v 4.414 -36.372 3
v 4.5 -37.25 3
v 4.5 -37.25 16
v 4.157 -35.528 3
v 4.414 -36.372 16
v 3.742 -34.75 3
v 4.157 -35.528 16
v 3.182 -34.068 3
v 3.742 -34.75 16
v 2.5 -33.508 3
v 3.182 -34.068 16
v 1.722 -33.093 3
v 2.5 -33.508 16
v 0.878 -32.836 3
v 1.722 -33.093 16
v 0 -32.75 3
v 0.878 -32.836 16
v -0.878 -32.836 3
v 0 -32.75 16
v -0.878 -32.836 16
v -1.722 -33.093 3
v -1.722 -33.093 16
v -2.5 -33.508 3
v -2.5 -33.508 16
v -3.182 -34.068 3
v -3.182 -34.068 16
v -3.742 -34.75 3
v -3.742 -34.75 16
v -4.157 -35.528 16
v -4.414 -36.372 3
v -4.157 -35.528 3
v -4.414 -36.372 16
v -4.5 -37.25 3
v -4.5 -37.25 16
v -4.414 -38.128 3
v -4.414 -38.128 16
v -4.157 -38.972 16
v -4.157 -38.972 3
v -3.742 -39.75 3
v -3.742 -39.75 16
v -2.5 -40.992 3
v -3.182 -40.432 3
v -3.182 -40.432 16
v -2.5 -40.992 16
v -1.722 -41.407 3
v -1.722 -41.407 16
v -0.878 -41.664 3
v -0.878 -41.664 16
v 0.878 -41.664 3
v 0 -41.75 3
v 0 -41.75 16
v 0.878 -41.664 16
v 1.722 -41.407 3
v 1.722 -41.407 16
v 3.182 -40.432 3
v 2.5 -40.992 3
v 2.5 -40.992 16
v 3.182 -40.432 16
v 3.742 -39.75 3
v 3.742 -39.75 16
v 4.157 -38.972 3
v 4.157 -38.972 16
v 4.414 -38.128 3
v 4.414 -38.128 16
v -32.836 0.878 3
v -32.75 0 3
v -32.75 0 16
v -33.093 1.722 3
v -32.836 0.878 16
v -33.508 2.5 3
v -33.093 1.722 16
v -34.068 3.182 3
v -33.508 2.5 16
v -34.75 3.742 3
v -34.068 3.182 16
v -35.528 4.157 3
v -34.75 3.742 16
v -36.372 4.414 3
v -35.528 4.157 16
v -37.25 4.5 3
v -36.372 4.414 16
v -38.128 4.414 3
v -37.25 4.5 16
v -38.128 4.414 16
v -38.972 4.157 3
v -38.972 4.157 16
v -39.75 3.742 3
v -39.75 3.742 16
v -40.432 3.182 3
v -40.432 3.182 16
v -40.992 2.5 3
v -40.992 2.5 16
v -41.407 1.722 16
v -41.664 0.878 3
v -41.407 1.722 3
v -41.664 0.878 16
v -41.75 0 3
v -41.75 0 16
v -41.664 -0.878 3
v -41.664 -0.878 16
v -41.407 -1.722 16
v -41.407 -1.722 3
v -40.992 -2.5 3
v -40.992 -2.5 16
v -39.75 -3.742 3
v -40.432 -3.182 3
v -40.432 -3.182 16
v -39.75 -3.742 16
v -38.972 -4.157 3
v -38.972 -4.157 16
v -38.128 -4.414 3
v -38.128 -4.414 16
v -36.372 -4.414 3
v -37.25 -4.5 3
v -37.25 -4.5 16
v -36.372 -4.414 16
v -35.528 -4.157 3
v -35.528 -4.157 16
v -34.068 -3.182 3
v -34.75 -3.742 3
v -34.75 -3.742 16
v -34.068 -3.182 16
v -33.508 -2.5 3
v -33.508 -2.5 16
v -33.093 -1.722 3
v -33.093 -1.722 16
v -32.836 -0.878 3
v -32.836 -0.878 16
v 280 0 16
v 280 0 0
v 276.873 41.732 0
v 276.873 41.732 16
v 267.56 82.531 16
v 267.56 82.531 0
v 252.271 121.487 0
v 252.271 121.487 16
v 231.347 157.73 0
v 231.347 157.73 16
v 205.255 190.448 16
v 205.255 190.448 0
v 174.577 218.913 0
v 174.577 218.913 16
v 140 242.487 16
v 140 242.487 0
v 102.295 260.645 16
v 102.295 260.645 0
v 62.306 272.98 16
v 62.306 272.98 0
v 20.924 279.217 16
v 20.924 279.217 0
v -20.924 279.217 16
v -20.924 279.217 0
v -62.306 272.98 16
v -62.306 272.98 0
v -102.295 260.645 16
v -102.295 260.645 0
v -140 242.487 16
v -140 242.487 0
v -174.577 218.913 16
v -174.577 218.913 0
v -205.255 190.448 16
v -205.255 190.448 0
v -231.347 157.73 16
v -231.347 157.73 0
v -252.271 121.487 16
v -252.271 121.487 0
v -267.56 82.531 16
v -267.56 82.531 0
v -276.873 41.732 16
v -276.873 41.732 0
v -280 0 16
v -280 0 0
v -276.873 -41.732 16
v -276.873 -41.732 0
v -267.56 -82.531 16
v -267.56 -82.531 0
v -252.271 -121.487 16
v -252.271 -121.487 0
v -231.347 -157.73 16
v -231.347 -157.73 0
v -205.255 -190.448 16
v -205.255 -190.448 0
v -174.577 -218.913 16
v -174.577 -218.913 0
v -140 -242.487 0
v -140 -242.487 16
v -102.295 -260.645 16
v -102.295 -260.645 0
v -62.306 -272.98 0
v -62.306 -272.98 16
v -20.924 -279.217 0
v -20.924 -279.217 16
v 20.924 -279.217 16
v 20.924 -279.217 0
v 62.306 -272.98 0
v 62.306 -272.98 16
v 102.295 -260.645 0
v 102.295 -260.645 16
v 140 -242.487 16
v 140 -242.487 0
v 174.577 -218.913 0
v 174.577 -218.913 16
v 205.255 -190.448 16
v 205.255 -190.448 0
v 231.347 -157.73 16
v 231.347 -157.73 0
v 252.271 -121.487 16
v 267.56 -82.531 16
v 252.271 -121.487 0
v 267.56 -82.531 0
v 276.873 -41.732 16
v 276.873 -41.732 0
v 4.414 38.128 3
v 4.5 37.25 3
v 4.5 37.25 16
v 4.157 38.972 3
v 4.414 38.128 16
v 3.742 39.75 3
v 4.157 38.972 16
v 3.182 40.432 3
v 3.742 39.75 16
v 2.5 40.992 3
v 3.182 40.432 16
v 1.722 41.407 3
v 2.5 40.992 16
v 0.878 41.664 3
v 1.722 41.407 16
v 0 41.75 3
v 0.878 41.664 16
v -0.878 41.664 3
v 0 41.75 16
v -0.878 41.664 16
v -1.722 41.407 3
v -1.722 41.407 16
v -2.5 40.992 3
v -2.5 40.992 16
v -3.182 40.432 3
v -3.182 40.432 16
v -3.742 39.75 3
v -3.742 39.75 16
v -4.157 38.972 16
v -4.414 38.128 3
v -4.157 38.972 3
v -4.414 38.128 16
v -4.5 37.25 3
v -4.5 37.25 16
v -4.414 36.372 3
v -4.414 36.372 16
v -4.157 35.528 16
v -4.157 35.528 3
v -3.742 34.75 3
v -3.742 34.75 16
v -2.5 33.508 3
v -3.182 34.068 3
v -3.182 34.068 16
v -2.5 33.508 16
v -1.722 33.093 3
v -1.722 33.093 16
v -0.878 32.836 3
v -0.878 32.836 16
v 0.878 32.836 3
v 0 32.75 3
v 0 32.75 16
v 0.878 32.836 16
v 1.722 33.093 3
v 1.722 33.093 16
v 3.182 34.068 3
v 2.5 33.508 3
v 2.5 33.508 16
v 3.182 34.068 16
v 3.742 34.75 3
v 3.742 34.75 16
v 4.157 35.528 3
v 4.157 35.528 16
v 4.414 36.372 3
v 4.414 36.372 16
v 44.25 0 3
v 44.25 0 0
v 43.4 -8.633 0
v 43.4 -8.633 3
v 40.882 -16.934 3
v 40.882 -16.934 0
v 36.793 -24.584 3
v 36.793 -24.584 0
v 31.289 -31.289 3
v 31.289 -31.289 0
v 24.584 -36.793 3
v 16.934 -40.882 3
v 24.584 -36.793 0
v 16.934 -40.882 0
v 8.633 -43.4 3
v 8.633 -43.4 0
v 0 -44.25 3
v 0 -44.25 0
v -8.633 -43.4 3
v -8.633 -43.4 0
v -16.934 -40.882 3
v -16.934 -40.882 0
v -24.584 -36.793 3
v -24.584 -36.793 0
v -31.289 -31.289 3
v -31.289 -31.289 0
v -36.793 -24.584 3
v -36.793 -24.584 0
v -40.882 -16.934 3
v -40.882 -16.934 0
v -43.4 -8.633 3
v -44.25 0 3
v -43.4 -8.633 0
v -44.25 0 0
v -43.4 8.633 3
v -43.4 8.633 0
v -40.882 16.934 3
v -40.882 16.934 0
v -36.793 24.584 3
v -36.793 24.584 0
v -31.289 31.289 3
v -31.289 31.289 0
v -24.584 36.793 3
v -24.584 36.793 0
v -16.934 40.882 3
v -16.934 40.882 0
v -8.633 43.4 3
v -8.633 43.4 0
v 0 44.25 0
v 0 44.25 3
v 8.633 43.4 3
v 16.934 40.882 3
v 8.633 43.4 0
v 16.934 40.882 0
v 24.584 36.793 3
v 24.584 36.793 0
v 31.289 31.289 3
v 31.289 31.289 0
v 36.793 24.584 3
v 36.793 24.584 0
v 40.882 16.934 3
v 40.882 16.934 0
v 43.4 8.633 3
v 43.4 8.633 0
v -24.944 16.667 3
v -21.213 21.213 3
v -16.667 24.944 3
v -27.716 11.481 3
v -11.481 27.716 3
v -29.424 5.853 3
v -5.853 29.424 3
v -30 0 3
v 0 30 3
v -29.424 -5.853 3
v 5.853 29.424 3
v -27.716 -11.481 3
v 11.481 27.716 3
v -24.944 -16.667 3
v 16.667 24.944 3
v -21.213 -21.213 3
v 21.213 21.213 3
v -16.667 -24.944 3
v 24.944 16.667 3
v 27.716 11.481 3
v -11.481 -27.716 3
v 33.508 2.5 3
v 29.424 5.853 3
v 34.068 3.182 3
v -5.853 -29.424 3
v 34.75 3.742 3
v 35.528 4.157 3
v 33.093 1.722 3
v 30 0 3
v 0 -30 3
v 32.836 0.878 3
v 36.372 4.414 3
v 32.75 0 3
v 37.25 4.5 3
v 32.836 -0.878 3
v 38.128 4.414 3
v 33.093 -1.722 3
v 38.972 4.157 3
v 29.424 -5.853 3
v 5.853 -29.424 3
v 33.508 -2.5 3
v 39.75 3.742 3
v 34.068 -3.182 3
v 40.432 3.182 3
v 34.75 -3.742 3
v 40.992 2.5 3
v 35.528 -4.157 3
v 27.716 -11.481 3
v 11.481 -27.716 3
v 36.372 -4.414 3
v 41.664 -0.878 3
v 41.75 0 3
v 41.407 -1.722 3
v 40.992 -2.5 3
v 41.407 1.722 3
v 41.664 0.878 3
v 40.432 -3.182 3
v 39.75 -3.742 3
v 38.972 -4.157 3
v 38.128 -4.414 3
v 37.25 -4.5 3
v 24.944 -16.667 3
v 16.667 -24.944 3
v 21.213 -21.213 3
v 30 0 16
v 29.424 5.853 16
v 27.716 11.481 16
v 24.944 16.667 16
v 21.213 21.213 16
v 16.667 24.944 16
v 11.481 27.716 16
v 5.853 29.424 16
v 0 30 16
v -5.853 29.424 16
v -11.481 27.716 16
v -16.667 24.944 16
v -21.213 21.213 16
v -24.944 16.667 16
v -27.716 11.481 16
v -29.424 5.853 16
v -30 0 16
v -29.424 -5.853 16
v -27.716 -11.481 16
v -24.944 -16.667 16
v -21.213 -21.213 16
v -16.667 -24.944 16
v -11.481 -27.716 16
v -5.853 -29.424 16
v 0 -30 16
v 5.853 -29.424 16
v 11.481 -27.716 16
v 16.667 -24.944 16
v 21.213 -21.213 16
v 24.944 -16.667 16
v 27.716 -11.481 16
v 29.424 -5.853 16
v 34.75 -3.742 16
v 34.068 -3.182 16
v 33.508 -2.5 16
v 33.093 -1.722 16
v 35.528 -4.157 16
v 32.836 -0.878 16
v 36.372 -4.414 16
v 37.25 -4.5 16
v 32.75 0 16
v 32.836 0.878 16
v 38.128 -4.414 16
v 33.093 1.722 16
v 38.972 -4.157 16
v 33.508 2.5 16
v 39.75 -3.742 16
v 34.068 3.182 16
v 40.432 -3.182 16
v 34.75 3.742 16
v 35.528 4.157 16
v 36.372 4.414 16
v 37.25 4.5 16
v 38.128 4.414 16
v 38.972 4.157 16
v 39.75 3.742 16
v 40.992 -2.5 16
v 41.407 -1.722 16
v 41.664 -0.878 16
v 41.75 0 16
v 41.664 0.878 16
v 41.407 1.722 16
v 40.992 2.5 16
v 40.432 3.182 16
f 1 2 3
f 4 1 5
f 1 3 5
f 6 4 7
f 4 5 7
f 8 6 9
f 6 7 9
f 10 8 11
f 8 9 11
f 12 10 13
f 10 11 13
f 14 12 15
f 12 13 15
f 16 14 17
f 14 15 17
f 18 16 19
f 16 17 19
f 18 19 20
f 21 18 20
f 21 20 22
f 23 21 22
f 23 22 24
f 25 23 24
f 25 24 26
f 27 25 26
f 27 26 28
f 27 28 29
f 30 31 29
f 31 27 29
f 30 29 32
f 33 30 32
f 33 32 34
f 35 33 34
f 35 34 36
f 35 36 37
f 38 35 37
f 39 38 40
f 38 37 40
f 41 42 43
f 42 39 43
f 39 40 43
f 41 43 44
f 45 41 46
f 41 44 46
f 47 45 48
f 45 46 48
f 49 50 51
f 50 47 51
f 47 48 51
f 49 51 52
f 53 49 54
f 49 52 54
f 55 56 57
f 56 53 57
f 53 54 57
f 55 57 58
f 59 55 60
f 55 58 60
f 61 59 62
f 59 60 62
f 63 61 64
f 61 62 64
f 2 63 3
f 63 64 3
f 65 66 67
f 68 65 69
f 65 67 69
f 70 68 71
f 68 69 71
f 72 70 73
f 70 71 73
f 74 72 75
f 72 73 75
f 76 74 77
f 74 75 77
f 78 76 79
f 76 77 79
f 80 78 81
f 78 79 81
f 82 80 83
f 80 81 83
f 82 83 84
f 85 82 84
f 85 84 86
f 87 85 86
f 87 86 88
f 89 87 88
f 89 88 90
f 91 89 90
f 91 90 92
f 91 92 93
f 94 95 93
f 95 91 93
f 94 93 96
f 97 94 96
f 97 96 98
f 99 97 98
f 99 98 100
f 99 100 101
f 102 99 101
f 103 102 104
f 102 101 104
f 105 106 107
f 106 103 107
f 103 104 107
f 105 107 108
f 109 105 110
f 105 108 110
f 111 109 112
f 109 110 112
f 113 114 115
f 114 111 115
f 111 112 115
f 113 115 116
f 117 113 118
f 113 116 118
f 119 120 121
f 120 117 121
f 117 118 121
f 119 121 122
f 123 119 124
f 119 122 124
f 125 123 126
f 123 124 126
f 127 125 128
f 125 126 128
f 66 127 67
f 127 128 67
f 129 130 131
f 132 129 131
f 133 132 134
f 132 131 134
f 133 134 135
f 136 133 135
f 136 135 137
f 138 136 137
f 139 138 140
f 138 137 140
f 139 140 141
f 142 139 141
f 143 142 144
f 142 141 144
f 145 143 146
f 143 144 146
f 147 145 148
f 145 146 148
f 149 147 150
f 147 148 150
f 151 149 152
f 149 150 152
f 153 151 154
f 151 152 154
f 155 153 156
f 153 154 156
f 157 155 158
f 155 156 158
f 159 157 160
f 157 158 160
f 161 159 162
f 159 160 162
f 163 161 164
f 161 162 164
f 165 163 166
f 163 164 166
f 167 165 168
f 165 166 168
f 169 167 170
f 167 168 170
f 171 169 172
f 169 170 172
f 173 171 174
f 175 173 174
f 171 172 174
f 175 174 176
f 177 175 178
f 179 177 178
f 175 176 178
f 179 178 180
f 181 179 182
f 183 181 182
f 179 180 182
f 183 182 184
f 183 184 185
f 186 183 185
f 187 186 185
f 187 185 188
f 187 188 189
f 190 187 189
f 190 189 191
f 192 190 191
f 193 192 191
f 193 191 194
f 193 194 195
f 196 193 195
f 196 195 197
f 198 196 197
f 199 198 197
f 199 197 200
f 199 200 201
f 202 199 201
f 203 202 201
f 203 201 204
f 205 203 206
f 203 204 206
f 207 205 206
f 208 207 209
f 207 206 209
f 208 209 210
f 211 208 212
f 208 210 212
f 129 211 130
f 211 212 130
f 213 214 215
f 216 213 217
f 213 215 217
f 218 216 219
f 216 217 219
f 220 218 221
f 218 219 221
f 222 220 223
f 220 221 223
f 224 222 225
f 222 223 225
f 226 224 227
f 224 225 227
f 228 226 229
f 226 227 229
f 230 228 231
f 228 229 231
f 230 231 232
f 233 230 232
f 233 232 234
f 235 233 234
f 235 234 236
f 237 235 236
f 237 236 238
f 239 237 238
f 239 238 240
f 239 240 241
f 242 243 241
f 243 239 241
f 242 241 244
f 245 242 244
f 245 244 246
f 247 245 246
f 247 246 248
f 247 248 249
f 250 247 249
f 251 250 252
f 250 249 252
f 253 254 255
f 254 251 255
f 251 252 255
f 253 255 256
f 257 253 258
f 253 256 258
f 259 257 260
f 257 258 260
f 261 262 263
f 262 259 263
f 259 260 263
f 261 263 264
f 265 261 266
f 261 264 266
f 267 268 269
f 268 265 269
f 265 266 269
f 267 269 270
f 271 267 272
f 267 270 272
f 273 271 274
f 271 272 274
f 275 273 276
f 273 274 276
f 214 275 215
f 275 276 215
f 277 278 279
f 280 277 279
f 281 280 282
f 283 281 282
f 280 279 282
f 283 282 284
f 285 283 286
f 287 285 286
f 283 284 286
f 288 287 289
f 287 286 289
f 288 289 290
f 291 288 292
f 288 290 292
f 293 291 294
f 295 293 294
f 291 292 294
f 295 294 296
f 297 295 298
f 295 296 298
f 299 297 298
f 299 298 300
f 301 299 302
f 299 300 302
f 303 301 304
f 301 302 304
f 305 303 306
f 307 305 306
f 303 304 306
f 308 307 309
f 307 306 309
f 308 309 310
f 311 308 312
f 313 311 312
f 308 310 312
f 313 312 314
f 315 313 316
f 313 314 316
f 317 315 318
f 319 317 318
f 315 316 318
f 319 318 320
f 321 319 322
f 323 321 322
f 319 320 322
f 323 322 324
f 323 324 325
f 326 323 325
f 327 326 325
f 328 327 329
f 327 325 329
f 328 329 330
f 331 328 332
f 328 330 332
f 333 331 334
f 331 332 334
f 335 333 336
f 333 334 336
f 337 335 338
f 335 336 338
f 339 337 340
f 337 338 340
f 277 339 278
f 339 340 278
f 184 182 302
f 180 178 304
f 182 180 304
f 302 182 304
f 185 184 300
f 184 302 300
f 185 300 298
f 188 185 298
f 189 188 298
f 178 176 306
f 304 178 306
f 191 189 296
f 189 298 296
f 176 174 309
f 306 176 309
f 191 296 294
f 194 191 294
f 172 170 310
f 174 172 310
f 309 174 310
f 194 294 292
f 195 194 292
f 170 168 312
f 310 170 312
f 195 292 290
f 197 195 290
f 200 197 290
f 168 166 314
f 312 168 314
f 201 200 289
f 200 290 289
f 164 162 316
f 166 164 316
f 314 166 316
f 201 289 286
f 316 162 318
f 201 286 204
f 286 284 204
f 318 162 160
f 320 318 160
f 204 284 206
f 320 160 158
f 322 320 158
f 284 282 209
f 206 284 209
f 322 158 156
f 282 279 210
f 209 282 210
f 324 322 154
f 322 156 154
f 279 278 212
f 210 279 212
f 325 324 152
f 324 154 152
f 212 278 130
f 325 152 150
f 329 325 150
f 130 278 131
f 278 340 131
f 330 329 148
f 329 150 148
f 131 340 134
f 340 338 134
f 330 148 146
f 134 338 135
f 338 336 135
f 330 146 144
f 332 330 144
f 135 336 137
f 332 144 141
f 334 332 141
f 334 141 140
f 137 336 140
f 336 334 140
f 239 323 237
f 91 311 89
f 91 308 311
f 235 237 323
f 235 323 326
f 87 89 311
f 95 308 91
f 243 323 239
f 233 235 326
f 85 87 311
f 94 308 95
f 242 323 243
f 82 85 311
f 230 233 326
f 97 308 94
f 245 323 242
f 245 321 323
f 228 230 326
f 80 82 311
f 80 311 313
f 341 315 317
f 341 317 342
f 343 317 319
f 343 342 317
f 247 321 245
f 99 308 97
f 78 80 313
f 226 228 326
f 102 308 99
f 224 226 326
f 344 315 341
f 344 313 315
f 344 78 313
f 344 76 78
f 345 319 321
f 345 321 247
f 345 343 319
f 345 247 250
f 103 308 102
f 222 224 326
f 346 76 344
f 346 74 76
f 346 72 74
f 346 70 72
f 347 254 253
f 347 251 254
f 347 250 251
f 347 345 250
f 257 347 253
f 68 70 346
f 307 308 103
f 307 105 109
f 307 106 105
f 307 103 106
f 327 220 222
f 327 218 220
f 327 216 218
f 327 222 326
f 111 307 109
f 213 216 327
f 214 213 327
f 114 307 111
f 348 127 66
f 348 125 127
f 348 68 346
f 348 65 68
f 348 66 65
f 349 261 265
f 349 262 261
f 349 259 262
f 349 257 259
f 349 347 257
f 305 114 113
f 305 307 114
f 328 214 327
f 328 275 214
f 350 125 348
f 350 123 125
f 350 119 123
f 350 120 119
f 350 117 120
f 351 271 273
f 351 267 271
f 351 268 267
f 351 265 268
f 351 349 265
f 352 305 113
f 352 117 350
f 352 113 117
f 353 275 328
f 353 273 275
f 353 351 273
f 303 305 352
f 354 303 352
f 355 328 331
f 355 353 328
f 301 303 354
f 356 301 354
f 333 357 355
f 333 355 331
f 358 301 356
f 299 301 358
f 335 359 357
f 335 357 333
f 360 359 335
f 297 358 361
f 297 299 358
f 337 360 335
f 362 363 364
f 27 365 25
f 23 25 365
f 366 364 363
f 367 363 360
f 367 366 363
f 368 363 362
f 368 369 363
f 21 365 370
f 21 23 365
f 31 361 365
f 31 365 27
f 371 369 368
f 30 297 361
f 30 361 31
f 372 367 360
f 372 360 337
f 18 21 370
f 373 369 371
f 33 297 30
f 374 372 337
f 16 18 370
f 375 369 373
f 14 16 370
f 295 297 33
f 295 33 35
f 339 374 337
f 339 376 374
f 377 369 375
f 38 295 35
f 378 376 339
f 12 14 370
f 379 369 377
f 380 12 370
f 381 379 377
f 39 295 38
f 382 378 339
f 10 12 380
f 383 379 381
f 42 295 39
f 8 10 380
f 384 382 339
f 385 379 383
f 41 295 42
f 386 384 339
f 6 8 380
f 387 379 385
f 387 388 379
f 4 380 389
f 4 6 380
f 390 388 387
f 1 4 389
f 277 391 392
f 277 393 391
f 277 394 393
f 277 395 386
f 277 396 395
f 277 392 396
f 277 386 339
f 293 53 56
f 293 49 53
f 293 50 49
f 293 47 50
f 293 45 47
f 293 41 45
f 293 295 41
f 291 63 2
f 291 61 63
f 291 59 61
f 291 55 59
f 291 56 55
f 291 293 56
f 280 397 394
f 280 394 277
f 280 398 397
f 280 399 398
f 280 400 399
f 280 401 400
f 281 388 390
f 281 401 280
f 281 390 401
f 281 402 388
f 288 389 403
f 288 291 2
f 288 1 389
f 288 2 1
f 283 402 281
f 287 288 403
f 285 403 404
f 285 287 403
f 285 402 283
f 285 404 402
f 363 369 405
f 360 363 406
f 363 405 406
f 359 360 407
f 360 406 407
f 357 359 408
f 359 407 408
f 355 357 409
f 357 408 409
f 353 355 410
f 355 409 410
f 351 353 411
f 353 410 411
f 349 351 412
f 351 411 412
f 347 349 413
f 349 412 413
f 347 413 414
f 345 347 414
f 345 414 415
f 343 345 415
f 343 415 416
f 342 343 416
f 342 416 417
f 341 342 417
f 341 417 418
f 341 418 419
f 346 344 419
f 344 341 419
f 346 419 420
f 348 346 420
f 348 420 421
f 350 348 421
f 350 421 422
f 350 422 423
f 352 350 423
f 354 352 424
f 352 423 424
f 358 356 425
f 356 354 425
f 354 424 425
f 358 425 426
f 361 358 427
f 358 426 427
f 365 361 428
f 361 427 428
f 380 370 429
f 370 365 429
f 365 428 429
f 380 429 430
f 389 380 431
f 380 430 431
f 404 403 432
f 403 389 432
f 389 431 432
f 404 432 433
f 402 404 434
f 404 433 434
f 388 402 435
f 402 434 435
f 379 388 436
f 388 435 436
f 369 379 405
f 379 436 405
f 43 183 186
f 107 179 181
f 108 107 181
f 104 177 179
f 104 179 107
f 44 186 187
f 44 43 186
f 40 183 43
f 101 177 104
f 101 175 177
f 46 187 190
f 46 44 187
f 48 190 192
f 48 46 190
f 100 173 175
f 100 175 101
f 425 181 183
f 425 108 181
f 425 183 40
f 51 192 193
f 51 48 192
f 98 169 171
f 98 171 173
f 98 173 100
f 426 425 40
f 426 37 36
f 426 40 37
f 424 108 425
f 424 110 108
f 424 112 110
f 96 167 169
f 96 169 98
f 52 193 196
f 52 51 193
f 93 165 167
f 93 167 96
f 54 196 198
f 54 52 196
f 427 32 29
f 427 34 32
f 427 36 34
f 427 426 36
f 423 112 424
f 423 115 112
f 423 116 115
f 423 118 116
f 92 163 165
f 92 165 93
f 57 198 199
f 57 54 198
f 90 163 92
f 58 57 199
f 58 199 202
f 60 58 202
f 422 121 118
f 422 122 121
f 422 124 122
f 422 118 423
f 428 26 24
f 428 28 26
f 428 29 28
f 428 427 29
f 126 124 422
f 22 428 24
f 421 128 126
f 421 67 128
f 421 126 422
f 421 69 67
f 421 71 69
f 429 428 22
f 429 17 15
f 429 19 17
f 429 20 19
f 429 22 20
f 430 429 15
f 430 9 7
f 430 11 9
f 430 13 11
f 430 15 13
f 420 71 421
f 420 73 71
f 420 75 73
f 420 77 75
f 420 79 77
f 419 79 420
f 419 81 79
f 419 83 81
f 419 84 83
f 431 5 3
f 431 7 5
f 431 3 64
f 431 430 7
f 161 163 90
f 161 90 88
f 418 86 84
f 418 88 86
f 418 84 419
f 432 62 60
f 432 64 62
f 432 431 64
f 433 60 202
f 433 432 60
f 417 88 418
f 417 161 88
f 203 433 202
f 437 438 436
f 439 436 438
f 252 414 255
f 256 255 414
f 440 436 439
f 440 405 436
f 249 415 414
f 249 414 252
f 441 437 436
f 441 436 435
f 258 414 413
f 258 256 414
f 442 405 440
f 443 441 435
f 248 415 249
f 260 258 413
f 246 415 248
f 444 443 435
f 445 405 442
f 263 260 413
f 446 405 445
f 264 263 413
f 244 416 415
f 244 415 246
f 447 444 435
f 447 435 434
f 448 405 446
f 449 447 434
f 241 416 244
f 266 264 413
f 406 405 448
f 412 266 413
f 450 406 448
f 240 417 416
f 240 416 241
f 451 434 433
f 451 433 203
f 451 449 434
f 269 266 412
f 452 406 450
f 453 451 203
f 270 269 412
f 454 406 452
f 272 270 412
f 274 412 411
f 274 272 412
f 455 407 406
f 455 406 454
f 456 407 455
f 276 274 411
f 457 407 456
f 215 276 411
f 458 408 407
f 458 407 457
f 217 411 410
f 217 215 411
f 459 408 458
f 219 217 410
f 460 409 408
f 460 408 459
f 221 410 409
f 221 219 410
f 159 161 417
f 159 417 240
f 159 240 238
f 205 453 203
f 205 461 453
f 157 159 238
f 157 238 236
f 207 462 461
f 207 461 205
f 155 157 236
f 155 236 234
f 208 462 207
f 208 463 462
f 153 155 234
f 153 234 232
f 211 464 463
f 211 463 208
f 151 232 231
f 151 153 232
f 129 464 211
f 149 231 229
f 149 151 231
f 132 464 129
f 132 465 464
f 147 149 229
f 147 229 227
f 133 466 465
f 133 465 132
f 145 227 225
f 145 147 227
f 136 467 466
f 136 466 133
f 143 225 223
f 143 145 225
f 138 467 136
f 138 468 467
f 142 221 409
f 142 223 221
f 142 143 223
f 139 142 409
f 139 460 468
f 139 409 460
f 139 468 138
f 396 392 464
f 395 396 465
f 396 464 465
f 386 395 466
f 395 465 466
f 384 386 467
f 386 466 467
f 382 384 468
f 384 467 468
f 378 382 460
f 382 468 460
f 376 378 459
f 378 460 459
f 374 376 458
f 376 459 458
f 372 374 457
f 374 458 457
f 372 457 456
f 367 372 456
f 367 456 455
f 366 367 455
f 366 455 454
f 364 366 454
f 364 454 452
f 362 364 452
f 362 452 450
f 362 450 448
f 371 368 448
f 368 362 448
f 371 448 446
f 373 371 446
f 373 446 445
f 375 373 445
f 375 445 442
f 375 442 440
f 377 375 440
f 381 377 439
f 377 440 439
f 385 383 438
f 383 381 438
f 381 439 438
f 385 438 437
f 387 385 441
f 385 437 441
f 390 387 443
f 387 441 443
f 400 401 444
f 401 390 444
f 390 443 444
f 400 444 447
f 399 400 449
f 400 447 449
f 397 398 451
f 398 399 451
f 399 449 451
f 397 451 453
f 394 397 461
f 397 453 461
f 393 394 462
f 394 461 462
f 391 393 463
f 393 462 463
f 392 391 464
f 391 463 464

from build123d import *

# Parameters (mm, degrees)
F0_R     = 280
F1_DEPTH = 16
F2_R     = 30
F2_R_2   = 4.5
F3_DEPTH = 25
F4_R     = 44.25
F4_R_2   = 4.5
F4_R_3   = 30
F5_DEPTH = 3


# Not quite as in the source:
# - a feature names something its author has since deleted; it is built from what else it names


with BuildPart() as f1:
    # F0 (on Top) → F1 (new body)
    with BuildSketch(Plane.XY):
        Circle(F0_R)
    extrude(amount=F1_DEPTH)

    # F2 (on face) → F3 (cut)
    with BuildSketch(Plane.XY.offset(16)):
        Circle(F2_R)
        with Locations((-37.25, 0)):
            Circle(F2_R_2)
        with Locations((0, 37.25)):
            Circle(F2_R_2)
        with Locations((37.25, 0)):
            Circle(F2_R_2)
        with Locations((0, -37.25)):
            Circle(F2_R_2)
    extrude(amount=-F3_DEPTH, mode=Mode.SUBTRACT)

    # F4 (on face) → F5 (cut)
    with BuildSketch(Plane(origin=(0, 0, 0), x_dir=(1, 0, 0), z_dir=(0, 0, -1))):
        Circle(F4_R)
        with Locations((0, -37.25)):
            Circle(F4_R_2, mode=Mode.SUBTRACT)
        with Locations((-37.25, 0)):
            Circle(F4_R_2, mode=Mode.SUBTRACT)
        Circle(F4_R_3, mode=Mode.SUBTRACT)
        with Locations((37.25, 0)):
            Circle(F4_R_2, mode=Mode.SUBTRACT)
        with Locations((0, 37.25)):
            Circle(F4_R_2, mode=Mode.SUBTRACT)
    extrude(amount=-F5_DEPTH, mode=Mode.SUBTRACT)


solid = f1.part
